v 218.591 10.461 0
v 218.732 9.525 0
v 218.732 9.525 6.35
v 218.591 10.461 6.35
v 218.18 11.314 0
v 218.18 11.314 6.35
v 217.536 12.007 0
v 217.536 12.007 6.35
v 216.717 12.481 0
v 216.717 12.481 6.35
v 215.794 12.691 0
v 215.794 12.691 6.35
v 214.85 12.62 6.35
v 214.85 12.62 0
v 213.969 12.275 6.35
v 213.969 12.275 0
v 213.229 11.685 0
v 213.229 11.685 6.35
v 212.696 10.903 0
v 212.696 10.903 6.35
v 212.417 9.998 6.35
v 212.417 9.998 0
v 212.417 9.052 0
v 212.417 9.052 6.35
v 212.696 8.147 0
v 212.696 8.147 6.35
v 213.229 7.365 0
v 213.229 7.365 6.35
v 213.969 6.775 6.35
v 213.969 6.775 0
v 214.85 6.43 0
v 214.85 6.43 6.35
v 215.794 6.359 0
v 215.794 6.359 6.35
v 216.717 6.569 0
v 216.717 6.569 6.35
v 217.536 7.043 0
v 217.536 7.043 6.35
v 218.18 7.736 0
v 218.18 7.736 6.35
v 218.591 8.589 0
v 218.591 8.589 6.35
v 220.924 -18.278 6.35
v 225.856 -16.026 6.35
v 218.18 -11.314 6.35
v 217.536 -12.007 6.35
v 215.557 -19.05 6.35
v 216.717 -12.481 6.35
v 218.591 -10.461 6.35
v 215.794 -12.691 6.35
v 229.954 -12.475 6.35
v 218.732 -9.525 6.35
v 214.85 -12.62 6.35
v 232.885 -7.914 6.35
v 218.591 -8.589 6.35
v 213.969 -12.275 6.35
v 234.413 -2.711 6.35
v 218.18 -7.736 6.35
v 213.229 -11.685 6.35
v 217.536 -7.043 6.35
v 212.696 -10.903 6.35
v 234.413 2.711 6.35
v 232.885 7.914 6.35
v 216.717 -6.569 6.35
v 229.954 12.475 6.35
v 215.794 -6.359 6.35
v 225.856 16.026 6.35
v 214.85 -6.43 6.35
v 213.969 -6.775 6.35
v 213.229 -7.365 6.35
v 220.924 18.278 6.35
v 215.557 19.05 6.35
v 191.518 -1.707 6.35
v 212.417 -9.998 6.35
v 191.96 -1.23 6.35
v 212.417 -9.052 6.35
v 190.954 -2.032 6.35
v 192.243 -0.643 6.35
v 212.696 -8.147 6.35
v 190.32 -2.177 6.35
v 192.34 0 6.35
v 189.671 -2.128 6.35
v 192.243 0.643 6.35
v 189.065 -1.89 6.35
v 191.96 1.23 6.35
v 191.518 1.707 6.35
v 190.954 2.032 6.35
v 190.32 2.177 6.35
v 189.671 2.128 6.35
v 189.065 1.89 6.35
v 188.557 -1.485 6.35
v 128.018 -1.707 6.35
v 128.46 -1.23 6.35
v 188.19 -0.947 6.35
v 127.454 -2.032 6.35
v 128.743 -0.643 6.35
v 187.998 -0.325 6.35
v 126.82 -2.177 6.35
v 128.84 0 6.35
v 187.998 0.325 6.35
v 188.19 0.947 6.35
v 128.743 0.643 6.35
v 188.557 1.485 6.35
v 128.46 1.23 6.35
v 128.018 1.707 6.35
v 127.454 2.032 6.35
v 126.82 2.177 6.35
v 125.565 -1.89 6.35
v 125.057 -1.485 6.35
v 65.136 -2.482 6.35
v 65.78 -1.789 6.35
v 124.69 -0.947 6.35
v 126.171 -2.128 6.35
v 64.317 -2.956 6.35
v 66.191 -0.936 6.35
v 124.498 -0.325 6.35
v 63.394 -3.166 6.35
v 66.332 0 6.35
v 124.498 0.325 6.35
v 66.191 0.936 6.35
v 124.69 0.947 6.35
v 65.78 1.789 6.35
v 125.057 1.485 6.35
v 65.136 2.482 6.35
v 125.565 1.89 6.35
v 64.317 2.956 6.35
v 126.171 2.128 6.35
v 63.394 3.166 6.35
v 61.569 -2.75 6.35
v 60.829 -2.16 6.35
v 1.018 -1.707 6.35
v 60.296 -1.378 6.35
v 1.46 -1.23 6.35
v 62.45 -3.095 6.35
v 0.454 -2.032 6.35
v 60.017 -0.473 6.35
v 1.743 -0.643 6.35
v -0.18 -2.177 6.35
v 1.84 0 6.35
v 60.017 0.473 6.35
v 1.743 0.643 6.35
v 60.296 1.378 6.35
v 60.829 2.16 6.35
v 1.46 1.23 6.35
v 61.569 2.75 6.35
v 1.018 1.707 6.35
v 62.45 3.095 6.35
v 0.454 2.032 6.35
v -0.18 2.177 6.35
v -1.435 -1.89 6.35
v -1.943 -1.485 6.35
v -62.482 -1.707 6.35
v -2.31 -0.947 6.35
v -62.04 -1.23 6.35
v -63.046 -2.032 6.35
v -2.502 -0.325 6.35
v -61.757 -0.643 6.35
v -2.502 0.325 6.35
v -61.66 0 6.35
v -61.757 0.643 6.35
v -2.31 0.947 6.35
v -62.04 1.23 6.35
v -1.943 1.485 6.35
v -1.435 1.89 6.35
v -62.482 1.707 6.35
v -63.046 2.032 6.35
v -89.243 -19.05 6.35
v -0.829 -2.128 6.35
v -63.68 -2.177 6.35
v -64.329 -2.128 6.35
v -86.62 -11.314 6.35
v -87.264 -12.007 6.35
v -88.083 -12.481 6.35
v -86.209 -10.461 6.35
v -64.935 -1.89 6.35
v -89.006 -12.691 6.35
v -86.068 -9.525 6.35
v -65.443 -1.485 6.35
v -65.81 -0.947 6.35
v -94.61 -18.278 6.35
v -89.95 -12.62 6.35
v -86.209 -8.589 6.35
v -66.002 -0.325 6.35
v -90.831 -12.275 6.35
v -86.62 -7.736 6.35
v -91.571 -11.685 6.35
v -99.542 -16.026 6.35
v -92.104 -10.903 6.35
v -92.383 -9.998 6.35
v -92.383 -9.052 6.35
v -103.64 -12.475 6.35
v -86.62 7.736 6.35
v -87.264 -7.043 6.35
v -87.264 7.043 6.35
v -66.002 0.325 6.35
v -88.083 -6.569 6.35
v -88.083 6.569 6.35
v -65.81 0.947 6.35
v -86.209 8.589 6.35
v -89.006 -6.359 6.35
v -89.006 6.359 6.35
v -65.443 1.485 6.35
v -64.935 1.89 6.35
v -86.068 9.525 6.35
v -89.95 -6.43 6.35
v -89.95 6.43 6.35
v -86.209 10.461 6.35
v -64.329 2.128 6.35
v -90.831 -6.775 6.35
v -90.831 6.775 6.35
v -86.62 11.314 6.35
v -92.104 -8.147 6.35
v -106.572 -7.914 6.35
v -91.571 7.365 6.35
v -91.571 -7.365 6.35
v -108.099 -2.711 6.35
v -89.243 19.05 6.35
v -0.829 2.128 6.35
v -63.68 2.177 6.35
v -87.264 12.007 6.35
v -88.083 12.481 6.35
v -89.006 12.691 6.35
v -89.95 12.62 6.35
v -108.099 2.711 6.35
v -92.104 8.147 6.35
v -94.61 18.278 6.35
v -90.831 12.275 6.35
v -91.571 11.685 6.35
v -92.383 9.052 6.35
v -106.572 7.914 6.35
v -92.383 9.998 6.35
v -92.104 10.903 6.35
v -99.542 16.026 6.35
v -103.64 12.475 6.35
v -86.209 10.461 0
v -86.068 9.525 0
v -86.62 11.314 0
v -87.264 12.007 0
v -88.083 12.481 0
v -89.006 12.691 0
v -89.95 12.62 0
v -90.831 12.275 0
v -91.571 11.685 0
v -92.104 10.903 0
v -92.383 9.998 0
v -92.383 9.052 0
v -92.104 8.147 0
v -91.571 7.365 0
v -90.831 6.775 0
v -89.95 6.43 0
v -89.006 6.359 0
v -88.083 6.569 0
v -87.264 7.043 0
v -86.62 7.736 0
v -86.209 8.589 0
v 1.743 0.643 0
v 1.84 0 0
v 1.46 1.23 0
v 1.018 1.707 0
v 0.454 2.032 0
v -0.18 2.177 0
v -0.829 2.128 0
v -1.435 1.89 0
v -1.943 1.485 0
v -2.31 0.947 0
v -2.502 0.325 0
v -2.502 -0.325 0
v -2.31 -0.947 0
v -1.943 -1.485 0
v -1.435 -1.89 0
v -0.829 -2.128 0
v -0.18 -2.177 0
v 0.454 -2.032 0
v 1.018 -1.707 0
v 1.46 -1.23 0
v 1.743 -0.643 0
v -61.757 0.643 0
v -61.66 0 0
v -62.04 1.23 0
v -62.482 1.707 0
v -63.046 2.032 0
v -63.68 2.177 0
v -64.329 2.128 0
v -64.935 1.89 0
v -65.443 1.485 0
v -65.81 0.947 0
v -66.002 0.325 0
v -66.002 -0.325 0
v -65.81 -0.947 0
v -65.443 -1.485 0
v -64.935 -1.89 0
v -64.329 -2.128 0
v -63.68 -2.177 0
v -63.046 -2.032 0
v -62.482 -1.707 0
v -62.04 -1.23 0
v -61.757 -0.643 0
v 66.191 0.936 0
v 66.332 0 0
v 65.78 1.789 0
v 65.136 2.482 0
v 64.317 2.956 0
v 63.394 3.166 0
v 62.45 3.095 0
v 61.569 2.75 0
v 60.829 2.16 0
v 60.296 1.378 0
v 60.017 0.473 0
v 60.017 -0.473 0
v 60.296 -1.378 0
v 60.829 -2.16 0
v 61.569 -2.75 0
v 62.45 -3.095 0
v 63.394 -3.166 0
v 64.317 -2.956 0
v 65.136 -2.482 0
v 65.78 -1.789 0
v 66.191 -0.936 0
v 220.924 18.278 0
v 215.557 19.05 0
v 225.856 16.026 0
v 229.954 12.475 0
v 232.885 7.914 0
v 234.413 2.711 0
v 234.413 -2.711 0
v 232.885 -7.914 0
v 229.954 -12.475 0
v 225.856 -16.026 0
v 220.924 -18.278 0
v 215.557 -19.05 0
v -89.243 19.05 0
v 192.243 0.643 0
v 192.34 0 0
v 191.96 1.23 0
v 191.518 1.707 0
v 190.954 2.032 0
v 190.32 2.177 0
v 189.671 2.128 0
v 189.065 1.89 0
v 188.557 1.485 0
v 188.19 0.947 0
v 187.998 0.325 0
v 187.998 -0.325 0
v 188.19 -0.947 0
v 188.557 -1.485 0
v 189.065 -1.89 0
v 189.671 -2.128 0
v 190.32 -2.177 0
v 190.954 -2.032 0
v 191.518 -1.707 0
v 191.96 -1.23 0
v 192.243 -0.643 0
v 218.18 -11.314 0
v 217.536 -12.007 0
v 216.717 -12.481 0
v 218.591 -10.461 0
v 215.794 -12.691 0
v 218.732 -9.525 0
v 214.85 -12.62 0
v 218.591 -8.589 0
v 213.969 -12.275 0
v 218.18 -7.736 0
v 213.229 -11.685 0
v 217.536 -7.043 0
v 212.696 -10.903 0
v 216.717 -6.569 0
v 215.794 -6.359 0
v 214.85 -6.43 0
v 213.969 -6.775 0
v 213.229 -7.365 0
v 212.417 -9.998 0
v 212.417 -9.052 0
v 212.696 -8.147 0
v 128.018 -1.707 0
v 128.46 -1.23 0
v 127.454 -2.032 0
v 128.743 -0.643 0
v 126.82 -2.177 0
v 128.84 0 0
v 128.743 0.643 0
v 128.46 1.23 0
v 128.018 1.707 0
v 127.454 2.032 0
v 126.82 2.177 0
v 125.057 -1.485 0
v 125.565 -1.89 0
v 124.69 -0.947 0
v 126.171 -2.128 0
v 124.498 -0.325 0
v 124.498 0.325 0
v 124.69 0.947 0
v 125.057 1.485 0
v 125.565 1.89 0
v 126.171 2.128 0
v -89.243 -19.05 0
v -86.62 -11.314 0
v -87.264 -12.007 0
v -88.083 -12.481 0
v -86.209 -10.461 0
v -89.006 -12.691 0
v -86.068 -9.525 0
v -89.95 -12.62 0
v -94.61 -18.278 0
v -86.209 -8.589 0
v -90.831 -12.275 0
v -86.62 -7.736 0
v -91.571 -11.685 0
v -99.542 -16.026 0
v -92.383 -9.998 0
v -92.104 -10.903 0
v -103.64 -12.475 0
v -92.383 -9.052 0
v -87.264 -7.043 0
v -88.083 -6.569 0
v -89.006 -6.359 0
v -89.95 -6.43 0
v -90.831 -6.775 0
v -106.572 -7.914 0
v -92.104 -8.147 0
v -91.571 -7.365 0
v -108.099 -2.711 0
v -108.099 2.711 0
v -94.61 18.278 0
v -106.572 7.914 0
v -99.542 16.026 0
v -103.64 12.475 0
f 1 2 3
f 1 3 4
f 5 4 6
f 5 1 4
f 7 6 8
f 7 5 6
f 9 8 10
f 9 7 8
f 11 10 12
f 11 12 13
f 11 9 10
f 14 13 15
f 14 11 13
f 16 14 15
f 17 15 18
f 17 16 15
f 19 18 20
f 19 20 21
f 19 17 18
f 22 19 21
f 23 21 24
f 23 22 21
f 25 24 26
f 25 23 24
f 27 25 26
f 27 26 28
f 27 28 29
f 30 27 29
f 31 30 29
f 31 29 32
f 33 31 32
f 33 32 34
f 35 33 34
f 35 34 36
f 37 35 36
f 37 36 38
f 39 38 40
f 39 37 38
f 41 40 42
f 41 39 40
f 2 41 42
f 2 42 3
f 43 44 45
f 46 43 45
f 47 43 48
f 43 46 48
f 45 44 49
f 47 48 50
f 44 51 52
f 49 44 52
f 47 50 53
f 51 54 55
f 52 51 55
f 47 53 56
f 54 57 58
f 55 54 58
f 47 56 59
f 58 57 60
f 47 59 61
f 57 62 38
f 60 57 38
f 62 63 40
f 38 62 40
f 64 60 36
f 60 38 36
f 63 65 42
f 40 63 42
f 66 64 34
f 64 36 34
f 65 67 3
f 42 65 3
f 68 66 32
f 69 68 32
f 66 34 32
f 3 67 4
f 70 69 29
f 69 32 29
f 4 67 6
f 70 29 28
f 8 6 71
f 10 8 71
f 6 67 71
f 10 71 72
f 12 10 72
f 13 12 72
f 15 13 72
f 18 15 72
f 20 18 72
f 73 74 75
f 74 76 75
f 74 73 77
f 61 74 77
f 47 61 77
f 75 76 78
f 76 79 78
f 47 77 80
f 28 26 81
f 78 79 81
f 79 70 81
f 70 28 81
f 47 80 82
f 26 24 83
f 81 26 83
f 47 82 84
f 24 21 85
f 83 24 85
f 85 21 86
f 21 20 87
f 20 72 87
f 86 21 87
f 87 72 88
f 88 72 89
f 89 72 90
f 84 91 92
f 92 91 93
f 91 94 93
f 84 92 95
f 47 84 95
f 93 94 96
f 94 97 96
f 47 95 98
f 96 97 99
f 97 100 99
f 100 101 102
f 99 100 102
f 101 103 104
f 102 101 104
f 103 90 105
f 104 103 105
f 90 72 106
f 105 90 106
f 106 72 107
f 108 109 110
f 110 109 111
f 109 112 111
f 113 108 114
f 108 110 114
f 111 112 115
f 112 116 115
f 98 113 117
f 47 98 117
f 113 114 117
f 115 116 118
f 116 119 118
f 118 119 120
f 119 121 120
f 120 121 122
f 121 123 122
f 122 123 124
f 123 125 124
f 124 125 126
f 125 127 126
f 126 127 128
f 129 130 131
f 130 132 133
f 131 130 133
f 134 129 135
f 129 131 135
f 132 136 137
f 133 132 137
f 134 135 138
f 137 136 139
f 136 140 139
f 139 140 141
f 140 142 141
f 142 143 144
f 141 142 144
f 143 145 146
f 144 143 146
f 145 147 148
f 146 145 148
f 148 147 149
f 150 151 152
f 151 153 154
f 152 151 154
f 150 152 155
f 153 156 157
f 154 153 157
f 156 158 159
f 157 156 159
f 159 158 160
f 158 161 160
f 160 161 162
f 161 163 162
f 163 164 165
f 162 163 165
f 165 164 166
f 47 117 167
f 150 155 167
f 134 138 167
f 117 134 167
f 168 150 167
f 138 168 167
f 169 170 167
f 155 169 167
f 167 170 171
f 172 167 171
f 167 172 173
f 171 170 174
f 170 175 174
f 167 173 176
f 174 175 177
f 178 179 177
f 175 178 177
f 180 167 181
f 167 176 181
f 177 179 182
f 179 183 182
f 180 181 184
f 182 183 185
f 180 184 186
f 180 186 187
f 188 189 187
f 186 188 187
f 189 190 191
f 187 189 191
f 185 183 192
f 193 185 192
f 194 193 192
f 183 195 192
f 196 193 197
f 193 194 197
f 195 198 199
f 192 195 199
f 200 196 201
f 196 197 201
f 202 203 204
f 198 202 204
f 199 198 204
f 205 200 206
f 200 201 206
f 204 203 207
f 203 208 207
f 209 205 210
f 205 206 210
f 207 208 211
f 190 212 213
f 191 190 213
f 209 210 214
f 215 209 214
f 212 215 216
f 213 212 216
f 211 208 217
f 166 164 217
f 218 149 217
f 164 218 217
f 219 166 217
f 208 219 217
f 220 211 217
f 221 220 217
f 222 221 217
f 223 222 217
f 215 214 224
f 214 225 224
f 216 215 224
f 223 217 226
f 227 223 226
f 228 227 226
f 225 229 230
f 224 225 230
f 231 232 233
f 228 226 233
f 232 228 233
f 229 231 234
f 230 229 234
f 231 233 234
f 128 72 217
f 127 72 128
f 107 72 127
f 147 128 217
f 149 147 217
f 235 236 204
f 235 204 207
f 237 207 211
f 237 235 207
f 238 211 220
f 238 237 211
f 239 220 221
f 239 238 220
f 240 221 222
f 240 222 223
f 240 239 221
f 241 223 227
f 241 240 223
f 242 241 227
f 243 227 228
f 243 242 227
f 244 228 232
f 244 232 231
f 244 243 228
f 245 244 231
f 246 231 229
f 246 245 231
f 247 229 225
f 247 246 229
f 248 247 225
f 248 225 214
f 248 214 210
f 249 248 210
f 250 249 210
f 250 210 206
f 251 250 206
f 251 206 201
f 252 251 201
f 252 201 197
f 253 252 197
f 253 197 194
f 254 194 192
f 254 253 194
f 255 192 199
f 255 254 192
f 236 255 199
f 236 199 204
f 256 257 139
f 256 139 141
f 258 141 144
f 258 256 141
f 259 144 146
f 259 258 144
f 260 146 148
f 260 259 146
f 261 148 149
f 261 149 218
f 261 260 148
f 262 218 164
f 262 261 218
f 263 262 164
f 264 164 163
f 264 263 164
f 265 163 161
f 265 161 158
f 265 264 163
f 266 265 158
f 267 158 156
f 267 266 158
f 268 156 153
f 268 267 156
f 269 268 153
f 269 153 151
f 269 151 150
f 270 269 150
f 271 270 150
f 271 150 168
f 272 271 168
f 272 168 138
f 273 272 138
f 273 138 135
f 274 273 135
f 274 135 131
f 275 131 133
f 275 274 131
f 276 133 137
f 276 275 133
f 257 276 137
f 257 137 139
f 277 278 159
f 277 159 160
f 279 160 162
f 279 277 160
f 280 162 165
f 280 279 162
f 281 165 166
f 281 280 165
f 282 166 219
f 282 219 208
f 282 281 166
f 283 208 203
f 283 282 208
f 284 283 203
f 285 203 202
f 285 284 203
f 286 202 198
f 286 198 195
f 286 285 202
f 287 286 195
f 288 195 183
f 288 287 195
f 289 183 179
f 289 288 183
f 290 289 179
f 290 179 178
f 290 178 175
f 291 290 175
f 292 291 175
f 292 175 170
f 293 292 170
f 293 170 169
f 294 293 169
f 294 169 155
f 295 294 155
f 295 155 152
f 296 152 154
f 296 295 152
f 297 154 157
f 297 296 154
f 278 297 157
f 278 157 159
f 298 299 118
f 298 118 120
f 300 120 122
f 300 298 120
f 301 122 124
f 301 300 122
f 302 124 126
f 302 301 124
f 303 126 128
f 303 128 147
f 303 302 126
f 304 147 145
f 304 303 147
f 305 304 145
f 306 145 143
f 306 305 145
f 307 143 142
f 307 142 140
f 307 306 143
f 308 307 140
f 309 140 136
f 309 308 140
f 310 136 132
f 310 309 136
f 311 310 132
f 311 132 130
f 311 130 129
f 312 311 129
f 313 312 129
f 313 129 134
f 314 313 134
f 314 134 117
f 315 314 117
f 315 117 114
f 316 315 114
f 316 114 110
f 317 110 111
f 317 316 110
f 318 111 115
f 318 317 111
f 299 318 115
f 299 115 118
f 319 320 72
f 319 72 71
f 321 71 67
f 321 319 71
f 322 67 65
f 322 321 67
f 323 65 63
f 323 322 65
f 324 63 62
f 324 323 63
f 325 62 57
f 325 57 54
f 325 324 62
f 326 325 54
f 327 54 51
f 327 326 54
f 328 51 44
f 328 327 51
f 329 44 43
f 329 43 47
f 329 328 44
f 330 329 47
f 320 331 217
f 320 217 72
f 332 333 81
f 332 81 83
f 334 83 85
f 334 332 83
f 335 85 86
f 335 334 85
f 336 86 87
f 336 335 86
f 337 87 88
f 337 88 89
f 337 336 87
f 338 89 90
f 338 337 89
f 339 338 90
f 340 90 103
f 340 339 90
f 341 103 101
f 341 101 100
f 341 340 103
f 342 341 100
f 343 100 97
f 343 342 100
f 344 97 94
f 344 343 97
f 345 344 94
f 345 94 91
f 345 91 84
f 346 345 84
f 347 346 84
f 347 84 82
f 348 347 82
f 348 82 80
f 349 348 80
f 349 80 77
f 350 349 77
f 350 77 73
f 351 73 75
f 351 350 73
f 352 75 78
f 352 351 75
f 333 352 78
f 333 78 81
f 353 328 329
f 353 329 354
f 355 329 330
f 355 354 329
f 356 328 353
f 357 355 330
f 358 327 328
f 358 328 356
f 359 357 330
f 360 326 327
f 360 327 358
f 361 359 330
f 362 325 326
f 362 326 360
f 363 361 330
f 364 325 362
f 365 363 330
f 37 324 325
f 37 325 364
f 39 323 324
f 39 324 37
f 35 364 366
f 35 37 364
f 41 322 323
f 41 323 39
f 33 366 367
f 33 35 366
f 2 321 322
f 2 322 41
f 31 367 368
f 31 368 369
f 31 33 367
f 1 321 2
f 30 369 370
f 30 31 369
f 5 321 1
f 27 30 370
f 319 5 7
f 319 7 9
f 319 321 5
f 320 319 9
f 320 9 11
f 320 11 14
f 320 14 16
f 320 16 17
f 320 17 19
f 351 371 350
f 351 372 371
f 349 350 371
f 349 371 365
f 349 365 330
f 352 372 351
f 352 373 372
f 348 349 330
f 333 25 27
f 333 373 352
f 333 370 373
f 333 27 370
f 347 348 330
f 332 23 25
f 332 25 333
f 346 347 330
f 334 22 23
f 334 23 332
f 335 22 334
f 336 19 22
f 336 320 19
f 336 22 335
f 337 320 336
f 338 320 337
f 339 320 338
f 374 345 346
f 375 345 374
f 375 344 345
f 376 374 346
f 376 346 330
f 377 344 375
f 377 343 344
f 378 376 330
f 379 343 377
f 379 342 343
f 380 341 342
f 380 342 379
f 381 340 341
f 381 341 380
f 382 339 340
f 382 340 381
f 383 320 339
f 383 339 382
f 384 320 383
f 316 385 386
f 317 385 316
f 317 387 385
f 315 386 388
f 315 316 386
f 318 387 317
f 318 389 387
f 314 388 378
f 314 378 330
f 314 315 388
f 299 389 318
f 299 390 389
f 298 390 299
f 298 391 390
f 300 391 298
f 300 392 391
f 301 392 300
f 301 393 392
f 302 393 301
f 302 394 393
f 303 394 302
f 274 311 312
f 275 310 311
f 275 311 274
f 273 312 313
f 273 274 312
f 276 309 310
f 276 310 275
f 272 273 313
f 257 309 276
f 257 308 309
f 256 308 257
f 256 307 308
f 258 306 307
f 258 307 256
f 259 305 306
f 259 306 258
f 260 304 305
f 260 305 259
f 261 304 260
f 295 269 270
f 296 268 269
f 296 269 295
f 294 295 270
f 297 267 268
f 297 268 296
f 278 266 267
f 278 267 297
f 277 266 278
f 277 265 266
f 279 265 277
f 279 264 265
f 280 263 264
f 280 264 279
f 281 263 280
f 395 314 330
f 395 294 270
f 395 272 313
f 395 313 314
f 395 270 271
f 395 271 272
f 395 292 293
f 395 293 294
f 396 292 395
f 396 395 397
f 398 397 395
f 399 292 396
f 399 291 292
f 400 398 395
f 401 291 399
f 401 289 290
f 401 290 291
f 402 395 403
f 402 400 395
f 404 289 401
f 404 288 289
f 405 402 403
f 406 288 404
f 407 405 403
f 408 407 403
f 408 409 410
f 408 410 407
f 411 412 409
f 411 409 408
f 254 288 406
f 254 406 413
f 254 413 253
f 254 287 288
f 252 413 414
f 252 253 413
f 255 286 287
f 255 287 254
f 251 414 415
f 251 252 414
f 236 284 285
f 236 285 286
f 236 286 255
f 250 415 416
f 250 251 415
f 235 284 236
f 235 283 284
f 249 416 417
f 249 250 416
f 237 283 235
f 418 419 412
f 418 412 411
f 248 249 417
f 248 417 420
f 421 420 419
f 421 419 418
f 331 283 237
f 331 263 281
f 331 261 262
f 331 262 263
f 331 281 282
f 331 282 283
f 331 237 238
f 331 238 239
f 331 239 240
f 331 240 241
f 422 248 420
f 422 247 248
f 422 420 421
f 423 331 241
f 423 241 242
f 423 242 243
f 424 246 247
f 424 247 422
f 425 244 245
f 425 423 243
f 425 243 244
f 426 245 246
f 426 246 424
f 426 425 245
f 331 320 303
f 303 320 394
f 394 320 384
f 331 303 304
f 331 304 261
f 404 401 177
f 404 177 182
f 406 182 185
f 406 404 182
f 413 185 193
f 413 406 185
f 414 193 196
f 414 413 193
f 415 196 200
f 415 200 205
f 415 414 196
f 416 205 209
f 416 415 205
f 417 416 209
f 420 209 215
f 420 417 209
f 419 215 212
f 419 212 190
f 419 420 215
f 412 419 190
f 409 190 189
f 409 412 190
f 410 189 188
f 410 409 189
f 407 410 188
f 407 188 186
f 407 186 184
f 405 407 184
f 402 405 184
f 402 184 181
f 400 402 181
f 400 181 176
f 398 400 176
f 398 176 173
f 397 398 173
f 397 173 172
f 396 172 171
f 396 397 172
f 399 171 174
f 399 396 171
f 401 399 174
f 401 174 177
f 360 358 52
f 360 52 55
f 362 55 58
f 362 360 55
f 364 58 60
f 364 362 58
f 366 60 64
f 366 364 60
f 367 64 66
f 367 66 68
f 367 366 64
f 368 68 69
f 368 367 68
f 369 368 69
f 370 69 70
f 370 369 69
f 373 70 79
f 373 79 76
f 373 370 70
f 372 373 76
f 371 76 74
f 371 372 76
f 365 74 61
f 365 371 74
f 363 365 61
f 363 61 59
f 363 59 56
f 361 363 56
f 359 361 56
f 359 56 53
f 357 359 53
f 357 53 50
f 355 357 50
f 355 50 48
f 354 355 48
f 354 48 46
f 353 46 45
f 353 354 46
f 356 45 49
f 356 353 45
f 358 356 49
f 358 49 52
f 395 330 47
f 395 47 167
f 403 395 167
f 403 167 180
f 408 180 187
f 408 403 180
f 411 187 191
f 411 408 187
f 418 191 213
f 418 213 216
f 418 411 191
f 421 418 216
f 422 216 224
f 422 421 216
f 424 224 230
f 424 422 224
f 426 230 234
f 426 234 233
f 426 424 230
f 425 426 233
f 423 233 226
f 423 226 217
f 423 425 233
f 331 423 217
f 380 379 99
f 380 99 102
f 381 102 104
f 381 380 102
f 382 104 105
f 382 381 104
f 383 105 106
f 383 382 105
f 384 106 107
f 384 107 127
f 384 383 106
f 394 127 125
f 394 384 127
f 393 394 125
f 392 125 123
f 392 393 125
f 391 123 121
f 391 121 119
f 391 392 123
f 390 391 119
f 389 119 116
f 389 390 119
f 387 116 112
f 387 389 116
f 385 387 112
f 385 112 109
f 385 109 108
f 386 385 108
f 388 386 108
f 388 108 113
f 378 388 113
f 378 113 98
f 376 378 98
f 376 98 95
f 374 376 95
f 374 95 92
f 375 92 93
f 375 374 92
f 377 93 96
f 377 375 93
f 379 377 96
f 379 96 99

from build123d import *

# Parameters (mm, degrees)
SKETCH1_R           = 3.175
SKETCH1_R_2         = 2.1828125
BOSS_EXTRUDE1_DEPTH = 6.35


with BuildPart() as part:
    # Sketch1 → Boss-Extrude1 (new body)
    with BuildSketch(Plane.XY):
        with BuildLine():
            Line((-89.243243243, 19.05), (215.556756757, 19.05))
            ThreePointArc((215.556756757, 19.05), (234.606756757, 0), (215.556756757, -19.05))
            Line((215.556756757, -19.05), (-89.243243243, -19.05))
            ThreePointArc((-89.243243243, -19.05), (-108.293243243, 0), (-89.243243243, 19.05))
        make_face()
        with Locations((63.156756757, 0)):
            Circle(SKETCH1_R, mode=Mode.SUBTRACT)
        with Locations((-0.343243243, 0)):
            Circle(SKETCH1_R_2, mode=Mode.SUBTRACT)
        with Locations((126.656756757, 0)):
            Circle(SKETCH1_R_2, mode=Mode.SUBTRACT)
        with Locations((215.556756757, -9.525)):
            Circle(SKETCH1_R, mode=Mode.SUBTRACT)
        with Locations((215.556756757, 9.525)):
            Circle(SKETCH1_R, mode=Mode.SUBTRACT)
        with Locations((-89.243243243, 9.525)):
            Circle(SKETCH1_R, mode=Mode.SUBTRACT)
        with Locations((-89.243243243, -9.525)):
            Circle(SKETCH1_R, mode=Mode.SUBTRACT)
        with Locations((-63.843243243, 0)):
            Circle(SKETCH1_R_2, mode=Mode.SUBTRACT)
        with Locations((190.156756757, 0)):
            Circle(SKETCH1_R_2, mode=Mode.SUBTRACT)
    extrude(amount=BOSS_EXTRUDE1_DEPTH)


solid = part.part
